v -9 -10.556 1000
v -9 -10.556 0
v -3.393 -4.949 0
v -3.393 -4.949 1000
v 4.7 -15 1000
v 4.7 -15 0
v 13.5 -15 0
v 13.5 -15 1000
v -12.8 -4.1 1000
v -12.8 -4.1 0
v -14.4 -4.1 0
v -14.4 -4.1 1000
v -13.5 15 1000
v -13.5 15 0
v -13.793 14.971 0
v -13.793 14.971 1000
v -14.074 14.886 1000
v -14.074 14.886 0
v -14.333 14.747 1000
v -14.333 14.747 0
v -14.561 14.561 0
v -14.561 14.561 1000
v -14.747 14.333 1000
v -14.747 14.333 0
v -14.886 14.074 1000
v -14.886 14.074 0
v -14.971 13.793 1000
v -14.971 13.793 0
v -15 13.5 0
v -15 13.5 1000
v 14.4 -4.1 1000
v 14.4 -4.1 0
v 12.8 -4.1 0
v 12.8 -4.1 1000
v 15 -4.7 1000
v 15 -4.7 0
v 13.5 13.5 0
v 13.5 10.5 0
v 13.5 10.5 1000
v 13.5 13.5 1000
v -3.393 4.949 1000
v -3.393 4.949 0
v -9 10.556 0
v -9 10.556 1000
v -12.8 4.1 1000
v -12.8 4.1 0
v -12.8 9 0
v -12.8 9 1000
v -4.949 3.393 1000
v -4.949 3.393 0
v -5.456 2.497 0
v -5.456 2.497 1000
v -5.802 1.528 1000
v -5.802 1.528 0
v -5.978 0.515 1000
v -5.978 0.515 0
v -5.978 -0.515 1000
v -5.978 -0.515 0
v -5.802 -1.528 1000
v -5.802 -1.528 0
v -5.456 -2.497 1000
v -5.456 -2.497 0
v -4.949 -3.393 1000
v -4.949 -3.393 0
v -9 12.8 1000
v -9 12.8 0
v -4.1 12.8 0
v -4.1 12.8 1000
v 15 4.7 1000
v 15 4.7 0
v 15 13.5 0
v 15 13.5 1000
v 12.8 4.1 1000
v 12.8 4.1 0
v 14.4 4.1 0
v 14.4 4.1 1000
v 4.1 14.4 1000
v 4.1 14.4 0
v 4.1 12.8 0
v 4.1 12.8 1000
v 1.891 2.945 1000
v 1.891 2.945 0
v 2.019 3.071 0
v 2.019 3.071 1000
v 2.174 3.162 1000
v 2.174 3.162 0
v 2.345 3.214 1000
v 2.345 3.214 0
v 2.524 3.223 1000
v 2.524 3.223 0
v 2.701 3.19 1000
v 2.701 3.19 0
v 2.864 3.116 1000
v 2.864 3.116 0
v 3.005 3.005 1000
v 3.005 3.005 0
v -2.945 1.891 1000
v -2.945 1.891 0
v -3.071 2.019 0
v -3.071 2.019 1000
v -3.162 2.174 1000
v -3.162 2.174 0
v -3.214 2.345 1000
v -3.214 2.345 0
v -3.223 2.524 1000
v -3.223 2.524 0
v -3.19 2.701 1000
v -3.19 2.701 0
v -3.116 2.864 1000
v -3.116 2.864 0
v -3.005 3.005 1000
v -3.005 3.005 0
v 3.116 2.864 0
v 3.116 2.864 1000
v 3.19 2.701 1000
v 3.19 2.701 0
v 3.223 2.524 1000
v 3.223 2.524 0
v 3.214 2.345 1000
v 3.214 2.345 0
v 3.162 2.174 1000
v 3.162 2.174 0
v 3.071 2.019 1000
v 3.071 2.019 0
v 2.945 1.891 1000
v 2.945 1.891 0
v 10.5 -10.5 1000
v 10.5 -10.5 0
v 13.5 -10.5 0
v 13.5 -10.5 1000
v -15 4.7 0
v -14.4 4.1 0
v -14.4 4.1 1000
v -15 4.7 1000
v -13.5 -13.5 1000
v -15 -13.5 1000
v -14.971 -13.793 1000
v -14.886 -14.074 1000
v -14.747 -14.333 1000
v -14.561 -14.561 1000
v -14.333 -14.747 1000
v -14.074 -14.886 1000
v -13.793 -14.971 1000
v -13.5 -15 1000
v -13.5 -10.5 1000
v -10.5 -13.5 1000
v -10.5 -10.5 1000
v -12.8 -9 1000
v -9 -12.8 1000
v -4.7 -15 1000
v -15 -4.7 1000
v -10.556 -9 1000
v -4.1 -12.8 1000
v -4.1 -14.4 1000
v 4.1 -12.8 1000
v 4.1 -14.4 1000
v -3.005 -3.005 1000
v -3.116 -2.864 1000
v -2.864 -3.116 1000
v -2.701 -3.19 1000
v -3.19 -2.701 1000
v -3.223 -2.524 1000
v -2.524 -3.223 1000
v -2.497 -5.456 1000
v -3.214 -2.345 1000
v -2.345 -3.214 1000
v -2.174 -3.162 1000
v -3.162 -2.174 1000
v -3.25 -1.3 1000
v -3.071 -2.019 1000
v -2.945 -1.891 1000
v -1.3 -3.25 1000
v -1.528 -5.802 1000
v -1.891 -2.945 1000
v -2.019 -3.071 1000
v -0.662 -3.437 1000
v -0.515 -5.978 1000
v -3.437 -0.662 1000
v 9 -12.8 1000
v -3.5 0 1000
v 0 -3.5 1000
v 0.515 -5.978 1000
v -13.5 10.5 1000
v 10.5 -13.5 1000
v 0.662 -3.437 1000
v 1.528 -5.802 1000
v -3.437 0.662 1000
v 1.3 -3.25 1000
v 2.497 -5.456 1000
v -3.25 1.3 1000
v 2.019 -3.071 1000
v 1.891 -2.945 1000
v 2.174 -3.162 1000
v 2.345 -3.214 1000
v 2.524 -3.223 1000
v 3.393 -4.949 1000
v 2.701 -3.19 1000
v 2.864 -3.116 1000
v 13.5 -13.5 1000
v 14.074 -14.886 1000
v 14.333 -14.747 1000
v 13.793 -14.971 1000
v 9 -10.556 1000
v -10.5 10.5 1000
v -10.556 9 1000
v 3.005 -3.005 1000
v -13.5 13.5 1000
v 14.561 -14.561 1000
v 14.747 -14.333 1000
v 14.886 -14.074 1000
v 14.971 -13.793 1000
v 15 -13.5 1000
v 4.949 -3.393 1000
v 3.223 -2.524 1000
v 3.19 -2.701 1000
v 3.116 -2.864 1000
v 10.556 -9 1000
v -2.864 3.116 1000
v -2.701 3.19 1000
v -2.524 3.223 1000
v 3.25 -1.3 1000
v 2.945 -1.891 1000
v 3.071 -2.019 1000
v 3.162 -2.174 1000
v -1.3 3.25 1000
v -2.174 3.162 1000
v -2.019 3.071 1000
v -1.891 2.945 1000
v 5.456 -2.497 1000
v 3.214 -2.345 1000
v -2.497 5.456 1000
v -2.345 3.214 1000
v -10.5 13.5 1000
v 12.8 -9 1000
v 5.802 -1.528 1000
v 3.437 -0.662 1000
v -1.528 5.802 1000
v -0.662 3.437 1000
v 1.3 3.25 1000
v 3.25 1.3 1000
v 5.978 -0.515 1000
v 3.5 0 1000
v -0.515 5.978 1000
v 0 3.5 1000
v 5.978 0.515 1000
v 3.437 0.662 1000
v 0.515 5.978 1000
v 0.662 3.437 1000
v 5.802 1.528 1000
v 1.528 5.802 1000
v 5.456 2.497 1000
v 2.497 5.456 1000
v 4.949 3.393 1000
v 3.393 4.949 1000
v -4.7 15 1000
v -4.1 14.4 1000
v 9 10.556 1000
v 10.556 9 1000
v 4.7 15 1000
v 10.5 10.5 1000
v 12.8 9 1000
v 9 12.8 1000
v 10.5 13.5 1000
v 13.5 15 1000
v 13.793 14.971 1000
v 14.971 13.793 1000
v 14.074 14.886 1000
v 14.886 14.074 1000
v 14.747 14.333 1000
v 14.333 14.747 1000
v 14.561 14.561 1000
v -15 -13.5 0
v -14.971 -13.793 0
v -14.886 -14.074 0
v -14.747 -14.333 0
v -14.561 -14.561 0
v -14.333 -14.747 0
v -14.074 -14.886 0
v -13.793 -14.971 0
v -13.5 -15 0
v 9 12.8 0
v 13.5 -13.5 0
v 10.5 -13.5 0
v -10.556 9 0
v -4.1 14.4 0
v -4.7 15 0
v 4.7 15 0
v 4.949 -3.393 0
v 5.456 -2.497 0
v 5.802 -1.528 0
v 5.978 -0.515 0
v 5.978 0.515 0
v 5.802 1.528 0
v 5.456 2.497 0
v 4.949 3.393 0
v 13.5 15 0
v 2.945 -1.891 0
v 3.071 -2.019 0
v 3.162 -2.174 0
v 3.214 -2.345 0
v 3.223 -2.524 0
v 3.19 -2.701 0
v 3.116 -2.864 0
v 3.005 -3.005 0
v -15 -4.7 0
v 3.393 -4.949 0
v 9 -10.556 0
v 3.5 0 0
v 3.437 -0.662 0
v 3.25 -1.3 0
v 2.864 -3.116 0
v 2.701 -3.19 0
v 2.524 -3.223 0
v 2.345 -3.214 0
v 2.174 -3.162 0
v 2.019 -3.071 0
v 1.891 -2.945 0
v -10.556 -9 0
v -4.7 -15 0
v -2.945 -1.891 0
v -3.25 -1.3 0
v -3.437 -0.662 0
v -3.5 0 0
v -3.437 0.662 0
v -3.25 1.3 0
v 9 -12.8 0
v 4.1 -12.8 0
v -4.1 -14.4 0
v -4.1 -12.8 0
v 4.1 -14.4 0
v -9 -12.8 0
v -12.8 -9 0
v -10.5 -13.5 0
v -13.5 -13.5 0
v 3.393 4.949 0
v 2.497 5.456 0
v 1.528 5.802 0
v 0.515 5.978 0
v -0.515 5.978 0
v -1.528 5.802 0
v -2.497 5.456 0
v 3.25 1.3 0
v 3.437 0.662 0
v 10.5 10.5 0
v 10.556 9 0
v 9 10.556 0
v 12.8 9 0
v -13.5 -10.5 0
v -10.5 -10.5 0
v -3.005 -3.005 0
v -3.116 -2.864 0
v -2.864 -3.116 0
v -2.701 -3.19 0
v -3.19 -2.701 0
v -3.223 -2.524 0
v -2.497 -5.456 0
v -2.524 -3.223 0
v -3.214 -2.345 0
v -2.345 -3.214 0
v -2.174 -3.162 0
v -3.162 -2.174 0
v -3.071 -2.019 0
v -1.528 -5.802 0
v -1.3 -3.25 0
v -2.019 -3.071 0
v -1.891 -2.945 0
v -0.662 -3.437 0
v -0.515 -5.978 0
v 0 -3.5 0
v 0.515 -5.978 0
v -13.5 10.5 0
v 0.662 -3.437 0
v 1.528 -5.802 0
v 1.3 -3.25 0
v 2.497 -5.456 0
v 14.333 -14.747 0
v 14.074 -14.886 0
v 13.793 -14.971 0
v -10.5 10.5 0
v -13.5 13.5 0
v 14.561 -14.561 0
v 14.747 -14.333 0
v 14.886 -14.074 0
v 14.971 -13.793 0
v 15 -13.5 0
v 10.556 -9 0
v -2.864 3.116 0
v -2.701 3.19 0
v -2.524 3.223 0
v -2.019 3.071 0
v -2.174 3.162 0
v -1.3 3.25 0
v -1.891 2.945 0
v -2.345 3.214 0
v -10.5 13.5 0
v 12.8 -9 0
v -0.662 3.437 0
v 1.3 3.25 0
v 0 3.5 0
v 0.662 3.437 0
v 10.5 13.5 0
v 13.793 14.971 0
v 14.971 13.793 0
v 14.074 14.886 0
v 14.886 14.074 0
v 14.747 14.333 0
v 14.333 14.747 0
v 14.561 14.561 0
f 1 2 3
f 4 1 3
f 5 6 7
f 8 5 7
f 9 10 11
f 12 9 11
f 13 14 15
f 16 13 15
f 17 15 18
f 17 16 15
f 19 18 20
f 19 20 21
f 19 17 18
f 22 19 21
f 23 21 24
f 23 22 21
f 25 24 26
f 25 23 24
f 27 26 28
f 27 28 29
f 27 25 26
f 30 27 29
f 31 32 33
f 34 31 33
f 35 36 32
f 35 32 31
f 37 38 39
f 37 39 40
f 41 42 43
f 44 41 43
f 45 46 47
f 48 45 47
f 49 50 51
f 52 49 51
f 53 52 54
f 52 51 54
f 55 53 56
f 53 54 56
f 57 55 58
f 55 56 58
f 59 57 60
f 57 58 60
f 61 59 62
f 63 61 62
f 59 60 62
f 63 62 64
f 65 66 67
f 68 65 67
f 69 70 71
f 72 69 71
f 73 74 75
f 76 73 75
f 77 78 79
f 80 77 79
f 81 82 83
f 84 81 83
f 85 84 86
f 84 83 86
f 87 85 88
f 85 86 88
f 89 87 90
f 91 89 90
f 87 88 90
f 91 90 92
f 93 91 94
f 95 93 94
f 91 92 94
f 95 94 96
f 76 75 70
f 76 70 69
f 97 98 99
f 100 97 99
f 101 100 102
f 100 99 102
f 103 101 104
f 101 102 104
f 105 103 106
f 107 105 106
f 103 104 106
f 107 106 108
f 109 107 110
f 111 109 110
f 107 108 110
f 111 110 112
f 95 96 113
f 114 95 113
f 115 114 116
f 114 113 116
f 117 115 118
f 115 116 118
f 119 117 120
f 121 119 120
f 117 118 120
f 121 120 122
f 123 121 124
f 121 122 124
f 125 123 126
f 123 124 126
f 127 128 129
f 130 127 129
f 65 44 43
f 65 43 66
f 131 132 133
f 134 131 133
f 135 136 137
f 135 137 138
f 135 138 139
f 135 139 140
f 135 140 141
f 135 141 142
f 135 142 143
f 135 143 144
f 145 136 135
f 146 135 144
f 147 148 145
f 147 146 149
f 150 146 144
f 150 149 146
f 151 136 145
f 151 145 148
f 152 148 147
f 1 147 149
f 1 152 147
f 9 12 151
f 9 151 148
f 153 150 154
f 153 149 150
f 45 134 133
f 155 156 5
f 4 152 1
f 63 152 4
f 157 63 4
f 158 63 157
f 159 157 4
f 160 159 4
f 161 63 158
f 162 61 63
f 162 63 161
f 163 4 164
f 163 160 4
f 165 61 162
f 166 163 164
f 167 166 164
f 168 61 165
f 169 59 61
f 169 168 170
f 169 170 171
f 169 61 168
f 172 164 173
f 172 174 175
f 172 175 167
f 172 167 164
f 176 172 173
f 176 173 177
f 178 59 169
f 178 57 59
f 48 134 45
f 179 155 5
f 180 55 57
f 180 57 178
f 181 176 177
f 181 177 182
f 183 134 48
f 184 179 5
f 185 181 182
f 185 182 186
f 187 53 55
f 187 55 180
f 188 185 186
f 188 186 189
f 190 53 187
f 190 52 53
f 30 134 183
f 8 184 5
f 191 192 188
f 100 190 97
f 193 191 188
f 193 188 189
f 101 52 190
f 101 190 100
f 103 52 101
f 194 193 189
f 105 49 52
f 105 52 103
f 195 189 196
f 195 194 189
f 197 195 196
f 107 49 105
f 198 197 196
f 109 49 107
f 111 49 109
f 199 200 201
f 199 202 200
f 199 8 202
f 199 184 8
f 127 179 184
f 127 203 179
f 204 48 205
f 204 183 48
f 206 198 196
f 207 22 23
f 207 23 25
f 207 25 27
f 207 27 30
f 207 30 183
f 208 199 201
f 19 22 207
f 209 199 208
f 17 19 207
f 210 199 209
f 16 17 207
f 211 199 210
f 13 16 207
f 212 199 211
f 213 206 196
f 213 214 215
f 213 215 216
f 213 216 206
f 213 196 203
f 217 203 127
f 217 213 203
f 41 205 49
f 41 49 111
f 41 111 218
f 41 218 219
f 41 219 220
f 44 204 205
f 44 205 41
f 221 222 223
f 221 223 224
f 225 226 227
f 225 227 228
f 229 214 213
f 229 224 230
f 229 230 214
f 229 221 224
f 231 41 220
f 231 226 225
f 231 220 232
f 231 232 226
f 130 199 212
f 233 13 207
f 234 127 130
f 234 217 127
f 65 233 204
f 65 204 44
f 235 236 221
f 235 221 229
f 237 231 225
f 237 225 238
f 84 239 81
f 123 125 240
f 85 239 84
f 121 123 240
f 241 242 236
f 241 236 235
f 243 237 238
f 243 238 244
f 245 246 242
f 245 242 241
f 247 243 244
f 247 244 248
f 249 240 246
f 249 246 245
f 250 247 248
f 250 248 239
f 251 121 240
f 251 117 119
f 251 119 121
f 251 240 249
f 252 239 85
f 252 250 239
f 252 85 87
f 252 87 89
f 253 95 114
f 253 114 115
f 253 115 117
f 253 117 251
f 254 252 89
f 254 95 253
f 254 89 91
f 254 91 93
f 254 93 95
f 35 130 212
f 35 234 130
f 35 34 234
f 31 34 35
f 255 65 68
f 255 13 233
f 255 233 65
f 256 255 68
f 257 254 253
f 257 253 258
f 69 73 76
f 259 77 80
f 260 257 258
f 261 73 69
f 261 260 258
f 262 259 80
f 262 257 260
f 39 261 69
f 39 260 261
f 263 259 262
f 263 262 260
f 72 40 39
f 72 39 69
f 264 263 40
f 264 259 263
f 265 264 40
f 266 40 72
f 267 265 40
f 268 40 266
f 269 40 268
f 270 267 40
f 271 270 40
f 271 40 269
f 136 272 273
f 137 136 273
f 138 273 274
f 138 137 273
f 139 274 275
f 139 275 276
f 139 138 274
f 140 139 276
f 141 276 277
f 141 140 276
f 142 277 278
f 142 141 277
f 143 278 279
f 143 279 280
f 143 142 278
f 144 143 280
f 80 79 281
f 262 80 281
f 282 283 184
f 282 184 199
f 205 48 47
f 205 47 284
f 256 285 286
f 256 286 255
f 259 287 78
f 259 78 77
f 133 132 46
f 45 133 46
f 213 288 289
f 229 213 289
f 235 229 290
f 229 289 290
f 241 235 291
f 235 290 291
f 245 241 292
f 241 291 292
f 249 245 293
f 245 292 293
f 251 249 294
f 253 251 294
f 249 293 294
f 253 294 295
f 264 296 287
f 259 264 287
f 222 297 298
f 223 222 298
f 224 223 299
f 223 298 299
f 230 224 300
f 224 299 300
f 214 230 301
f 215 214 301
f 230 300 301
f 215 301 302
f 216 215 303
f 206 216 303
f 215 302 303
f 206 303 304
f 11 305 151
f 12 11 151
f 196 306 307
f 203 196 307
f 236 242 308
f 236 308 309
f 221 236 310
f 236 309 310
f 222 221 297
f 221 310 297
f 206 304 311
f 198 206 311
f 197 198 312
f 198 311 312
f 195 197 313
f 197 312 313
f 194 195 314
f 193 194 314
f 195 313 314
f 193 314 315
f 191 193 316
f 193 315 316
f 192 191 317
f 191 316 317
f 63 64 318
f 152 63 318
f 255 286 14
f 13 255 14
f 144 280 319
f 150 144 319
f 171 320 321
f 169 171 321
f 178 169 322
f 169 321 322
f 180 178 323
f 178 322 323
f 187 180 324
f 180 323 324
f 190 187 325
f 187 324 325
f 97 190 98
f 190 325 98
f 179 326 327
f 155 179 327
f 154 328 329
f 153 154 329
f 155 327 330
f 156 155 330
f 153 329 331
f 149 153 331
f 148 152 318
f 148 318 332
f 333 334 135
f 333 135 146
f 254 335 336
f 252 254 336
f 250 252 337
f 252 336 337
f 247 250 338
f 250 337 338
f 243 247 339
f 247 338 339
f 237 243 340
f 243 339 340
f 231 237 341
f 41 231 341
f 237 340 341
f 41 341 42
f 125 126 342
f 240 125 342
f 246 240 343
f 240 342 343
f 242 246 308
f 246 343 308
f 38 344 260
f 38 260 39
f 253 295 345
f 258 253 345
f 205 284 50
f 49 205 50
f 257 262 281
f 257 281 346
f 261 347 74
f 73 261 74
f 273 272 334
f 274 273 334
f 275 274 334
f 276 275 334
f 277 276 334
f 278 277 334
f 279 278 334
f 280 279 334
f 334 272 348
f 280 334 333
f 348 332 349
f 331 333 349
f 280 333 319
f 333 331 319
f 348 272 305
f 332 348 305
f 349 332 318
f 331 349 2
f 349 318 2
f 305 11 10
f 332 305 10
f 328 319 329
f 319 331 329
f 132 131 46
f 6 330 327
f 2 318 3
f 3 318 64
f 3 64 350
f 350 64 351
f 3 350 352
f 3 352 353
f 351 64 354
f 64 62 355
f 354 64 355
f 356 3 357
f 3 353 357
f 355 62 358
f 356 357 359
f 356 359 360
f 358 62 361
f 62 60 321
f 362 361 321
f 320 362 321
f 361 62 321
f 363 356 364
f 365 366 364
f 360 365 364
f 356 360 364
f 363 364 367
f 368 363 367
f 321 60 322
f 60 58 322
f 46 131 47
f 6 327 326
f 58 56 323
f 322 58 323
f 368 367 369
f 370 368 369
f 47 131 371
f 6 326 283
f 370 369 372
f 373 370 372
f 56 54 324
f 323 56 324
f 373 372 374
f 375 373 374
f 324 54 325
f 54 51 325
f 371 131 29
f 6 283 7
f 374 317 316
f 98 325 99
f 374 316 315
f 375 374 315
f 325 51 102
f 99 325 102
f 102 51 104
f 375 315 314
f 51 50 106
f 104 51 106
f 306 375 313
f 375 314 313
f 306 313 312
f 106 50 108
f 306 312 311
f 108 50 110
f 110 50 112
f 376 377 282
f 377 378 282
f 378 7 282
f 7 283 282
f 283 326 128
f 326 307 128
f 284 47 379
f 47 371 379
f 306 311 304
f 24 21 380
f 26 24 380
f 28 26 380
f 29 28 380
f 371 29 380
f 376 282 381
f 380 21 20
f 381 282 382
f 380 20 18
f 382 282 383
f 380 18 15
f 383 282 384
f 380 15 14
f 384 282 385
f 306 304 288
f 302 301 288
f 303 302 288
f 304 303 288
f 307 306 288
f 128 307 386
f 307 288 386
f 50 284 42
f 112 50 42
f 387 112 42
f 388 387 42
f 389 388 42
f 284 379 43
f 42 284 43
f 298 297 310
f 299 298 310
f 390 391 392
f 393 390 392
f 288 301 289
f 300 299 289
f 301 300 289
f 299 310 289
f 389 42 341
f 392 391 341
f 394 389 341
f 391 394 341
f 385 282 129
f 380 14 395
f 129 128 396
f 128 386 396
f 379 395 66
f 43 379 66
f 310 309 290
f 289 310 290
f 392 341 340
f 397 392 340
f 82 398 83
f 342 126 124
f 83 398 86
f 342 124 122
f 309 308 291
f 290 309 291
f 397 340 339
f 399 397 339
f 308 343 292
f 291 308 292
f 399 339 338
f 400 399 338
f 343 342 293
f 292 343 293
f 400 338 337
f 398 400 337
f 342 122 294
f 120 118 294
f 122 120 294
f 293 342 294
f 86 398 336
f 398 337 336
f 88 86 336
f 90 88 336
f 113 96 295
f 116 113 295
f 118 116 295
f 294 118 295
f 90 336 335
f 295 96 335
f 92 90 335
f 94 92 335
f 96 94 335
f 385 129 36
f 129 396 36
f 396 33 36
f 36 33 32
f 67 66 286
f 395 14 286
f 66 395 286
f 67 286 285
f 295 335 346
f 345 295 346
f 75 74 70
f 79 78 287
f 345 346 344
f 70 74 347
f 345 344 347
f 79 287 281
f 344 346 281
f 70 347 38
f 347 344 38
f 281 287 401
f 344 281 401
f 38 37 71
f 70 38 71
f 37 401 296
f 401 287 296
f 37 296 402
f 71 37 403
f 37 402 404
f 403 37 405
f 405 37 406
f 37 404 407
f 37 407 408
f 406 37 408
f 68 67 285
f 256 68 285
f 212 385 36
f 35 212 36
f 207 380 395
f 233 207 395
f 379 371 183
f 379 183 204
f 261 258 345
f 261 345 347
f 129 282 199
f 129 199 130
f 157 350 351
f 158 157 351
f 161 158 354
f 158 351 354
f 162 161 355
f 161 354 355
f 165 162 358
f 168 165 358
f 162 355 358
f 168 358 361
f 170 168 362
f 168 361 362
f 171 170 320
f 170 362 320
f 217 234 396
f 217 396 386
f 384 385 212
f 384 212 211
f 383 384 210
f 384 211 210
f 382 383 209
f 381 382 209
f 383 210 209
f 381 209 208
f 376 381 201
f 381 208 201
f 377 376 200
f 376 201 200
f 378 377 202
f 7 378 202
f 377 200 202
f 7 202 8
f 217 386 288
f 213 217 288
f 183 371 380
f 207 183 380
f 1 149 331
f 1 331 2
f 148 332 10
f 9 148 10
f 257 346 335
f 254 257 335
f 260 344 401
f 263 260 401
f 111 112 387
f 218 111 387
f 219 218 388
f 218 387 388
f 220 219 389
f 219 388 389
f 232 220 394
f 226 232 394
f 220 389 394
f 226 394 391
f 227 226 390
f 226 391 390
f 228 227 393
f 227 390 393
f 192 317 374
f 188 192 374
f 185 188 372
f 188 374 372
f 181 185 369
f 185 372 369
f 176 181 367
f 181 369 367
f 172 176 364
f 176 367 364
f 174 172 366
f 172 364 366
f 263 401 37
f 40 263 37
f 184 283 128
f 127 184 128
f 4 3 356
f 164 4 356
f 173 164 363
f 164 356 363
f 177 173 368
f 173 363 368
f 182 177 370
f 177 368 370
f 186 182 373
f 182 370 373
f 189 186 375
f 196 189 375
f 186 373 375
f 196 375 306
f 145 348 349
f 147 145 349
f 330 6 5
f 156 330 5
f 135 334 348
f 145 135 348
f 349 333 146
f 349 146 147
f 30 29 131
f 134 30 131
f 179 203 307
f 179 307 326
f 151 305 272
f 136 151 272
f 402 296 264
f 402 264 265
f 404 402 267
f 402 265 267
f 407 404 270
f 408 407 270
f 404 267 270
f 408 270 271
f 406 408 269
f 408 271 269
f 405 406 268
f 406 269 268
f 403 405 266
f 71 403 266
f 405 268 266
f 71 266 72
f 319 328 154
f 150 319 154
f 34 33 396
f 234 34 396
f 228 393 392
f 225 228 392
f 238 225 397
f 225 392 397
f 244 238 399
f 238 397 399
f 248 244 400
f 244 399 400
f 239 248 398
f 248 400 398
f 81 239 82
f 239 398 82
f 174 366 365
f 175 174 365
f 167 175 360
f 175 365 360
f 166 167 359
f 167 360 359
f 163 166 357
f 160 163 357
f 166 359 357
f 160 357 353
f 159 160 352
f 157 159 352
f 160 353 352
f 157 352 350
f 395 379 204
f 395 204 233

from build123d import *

# Parameters (mm, degrees)
F0_W     = 3
F0_H     = 3
F1_DEPTH = 1000
F2_R     = 1.5
F3_SIZE  = 0.6


with BuildPart() as f1:
    # F0 (on Top) → F1 (new body)
    with BuildSketch(Plane.XY):
        with BuildLine():
            Line((-4.1, 15), (-15, 15))
            Line((-15, 15), (-15, 4.1))
            Line((-15, 4.1), (-12.8, 4.1))
            Line((-12.8, 4.1), (-12.8, 9))
            Line((-12.8, 9), (-10.555635, 9))
            Line((-10.555635, 9), (-4.948549, 3.392914))
            ThreePointArc((-4.948549, 3.392914), (-6, 0), (-4.948549, -3.392914))
            Line((-4.948549, -3.392914), (-10.555635, -9))
            Line((-10.555635, -9), (-12.8, -9))
            Line((-12.8, -9), (-12.8, -4.1))
            Line((-12.8, -4.1), (-15, -4.1))
            Line((-15, -4.1), (-15, -15))
            Line((-15, -15), (-4.1, -15))
            Line((-4.1, -15), (-4.1, -12.8))
            Line((-4.1, -12.8), (-9, -12.8))
            Line((-9, -12.8), (-9, -10.555635))
            Line((-9, -10.555635), (-3.392914, -4.948549))
            ThreePointArc((-3.392914, -4.948549), (0, -6), (3.392914, -4.948549))
            Line((3.392914, -4.948549), (9, -10.555635))
            Line((9, -10.555635), (9, -12.8))
            Line((9, -12.8), (4.1, -12.8))
            Line((4.1, -12.8), (4.1, -15))
            Line((4.1, -15), (15, -15))
            Line((15, -15), (15, -4.1))
            Line((15, -4.1), (13.5, -4.1))
            Line((13.5, -4.1), (12.8, -4.1))
            Line((12.8, -4.1), (12.8, -9))
            Line((12.8, -9), (10.555635, -9))
            Line((10.555635, -9), (4.948549, -3.392914))
            ThreePointArc((4.948549, -3.392914), (6, 0), (4.948549, 3.392914))
            Line((4.948549, 3.392914), (10.555635, 9))
            Line((10.555635, 9), (12.8, 9))
            Line((12.8, 9), (12.8, 4.1))
            Line((12.8, 4.1), (13.5, 4.1))
            Line((13.5, 4.1), (15, 4.1))
            Line((15, 4.1), (15, 15))
            Line((15, 15), (4.1, 15))
            Line((4.1, 15), (4.1, 12.8))
            Line((4.1, 12.8), (9, 12.8))
            Line((9, 12.8), (9, 10.555635))
            Line((9, 10.555635), (3.392914, 4.948549))
            ThreePointArc((3.392914, 4.948549), (0, 6), (-3.392914, 4.948549))
            Line((-3.392914, 4.948549), (-9, 10.555635))
            Line((-9, 10.555635), (-9, 12.8))
            Line((-9, 12.8), (-4.1, 12.8))
            Line((-4.1, 12.8), (-4.1, 15))
        make_face()
        with Locations((-12, -12)):
            Rectangle(F0_W, F0_H, mode=Mode.SUBTRACT)
        with Locations((12, -12)):
            Rectangle(F0_W, F0_H, mode=Mode.SUBTRACT)
        with Locations((-12, 12)):
            Rectangle(F0_W, F0_H, mode=Mode.SUBTRACT)
        with BuildLine():
            ThreePointArc((2.94533, 1.890775), (3.358471, 0.985227), (3.5, 0))
            ThreePointArc((3.5, 0), (3.358471, -0.985227), (2.94533, -1.890775))
            ThreePointArc((2.94533, -1.890775), (3.223794, -2.434637), (3.005204, -3.005204))
            ThreePointArc((3.005204, -3.005204), (2.434637, -3.223794), (1.890775, -2.94533))
            ThreePointArc((1.890775, -2.94533), (0, -3.5), (-1.890775, -2.94533))
            ThreePointArc((-1.890775, -2.94533), (-2.434637, -3.223794), (-3.005204, -3.005204))
            ThreePointArc((-3.005204, -3.005204), (-3.223794, -2.434637), (-2.94533, -1.890775))
            ThreePointArc((-2.94533, -1.890775), (-3.5, 0), (-2.94533, 1.890775))
            ThreePointArc((-2.94533, 1.890775), (-3.223794, 2.434637), (-3.005204, 3.005204))
            ThreePointArc((-3.005204, 3.005204), (-2.434637, 3.223794), (-1.890775, 2.94533))
            ThreePointArc((-1.890775, 2.94533), (0, 3.5), (1.890775, 2.94533))
            ThreePointArc((1.890775, 2.94533), (2.434637, 3.223794), (3.005204, 3.005204))
            ThreePointArc((3.005204, 3.005204), (3.223794, 2.434637), (2.94533, 1.890775))
        make_face(mode=Mode.SUBTRACT)
        with Locations((12, 12)):
            Rectangle(F0_W, F0_H, mode=Mode.SUBTRACT)
    extrude(amount=F1_DEPTH)

    # F2
    f2_edges = [f1.edges().sort_by_distance(p)[0] for p in [
        (15, 15, 500),
        (-15, 15, 500),
        (15, -15, 500),
        (-15, -15, 500),
    ]]
    fillet(f2_edges, radius=F2_R)

    # F3
    f3_edges = [f1.edges().sort_by_distance(p)[0] for p in [
        (-4.1, 15, 500),
        (4.1, 15, 500),
        (15, 4.1, 500),
        (15, -4.1, 500),
        (-15, 4.1, 500),
        (-15, -4.1, 500),
        (4.1, -15, 500),
        (-4.1, -15, 500),
    ]]
    chamfer(f3_edges, length=F3_SIZE)


solid = f1.part
